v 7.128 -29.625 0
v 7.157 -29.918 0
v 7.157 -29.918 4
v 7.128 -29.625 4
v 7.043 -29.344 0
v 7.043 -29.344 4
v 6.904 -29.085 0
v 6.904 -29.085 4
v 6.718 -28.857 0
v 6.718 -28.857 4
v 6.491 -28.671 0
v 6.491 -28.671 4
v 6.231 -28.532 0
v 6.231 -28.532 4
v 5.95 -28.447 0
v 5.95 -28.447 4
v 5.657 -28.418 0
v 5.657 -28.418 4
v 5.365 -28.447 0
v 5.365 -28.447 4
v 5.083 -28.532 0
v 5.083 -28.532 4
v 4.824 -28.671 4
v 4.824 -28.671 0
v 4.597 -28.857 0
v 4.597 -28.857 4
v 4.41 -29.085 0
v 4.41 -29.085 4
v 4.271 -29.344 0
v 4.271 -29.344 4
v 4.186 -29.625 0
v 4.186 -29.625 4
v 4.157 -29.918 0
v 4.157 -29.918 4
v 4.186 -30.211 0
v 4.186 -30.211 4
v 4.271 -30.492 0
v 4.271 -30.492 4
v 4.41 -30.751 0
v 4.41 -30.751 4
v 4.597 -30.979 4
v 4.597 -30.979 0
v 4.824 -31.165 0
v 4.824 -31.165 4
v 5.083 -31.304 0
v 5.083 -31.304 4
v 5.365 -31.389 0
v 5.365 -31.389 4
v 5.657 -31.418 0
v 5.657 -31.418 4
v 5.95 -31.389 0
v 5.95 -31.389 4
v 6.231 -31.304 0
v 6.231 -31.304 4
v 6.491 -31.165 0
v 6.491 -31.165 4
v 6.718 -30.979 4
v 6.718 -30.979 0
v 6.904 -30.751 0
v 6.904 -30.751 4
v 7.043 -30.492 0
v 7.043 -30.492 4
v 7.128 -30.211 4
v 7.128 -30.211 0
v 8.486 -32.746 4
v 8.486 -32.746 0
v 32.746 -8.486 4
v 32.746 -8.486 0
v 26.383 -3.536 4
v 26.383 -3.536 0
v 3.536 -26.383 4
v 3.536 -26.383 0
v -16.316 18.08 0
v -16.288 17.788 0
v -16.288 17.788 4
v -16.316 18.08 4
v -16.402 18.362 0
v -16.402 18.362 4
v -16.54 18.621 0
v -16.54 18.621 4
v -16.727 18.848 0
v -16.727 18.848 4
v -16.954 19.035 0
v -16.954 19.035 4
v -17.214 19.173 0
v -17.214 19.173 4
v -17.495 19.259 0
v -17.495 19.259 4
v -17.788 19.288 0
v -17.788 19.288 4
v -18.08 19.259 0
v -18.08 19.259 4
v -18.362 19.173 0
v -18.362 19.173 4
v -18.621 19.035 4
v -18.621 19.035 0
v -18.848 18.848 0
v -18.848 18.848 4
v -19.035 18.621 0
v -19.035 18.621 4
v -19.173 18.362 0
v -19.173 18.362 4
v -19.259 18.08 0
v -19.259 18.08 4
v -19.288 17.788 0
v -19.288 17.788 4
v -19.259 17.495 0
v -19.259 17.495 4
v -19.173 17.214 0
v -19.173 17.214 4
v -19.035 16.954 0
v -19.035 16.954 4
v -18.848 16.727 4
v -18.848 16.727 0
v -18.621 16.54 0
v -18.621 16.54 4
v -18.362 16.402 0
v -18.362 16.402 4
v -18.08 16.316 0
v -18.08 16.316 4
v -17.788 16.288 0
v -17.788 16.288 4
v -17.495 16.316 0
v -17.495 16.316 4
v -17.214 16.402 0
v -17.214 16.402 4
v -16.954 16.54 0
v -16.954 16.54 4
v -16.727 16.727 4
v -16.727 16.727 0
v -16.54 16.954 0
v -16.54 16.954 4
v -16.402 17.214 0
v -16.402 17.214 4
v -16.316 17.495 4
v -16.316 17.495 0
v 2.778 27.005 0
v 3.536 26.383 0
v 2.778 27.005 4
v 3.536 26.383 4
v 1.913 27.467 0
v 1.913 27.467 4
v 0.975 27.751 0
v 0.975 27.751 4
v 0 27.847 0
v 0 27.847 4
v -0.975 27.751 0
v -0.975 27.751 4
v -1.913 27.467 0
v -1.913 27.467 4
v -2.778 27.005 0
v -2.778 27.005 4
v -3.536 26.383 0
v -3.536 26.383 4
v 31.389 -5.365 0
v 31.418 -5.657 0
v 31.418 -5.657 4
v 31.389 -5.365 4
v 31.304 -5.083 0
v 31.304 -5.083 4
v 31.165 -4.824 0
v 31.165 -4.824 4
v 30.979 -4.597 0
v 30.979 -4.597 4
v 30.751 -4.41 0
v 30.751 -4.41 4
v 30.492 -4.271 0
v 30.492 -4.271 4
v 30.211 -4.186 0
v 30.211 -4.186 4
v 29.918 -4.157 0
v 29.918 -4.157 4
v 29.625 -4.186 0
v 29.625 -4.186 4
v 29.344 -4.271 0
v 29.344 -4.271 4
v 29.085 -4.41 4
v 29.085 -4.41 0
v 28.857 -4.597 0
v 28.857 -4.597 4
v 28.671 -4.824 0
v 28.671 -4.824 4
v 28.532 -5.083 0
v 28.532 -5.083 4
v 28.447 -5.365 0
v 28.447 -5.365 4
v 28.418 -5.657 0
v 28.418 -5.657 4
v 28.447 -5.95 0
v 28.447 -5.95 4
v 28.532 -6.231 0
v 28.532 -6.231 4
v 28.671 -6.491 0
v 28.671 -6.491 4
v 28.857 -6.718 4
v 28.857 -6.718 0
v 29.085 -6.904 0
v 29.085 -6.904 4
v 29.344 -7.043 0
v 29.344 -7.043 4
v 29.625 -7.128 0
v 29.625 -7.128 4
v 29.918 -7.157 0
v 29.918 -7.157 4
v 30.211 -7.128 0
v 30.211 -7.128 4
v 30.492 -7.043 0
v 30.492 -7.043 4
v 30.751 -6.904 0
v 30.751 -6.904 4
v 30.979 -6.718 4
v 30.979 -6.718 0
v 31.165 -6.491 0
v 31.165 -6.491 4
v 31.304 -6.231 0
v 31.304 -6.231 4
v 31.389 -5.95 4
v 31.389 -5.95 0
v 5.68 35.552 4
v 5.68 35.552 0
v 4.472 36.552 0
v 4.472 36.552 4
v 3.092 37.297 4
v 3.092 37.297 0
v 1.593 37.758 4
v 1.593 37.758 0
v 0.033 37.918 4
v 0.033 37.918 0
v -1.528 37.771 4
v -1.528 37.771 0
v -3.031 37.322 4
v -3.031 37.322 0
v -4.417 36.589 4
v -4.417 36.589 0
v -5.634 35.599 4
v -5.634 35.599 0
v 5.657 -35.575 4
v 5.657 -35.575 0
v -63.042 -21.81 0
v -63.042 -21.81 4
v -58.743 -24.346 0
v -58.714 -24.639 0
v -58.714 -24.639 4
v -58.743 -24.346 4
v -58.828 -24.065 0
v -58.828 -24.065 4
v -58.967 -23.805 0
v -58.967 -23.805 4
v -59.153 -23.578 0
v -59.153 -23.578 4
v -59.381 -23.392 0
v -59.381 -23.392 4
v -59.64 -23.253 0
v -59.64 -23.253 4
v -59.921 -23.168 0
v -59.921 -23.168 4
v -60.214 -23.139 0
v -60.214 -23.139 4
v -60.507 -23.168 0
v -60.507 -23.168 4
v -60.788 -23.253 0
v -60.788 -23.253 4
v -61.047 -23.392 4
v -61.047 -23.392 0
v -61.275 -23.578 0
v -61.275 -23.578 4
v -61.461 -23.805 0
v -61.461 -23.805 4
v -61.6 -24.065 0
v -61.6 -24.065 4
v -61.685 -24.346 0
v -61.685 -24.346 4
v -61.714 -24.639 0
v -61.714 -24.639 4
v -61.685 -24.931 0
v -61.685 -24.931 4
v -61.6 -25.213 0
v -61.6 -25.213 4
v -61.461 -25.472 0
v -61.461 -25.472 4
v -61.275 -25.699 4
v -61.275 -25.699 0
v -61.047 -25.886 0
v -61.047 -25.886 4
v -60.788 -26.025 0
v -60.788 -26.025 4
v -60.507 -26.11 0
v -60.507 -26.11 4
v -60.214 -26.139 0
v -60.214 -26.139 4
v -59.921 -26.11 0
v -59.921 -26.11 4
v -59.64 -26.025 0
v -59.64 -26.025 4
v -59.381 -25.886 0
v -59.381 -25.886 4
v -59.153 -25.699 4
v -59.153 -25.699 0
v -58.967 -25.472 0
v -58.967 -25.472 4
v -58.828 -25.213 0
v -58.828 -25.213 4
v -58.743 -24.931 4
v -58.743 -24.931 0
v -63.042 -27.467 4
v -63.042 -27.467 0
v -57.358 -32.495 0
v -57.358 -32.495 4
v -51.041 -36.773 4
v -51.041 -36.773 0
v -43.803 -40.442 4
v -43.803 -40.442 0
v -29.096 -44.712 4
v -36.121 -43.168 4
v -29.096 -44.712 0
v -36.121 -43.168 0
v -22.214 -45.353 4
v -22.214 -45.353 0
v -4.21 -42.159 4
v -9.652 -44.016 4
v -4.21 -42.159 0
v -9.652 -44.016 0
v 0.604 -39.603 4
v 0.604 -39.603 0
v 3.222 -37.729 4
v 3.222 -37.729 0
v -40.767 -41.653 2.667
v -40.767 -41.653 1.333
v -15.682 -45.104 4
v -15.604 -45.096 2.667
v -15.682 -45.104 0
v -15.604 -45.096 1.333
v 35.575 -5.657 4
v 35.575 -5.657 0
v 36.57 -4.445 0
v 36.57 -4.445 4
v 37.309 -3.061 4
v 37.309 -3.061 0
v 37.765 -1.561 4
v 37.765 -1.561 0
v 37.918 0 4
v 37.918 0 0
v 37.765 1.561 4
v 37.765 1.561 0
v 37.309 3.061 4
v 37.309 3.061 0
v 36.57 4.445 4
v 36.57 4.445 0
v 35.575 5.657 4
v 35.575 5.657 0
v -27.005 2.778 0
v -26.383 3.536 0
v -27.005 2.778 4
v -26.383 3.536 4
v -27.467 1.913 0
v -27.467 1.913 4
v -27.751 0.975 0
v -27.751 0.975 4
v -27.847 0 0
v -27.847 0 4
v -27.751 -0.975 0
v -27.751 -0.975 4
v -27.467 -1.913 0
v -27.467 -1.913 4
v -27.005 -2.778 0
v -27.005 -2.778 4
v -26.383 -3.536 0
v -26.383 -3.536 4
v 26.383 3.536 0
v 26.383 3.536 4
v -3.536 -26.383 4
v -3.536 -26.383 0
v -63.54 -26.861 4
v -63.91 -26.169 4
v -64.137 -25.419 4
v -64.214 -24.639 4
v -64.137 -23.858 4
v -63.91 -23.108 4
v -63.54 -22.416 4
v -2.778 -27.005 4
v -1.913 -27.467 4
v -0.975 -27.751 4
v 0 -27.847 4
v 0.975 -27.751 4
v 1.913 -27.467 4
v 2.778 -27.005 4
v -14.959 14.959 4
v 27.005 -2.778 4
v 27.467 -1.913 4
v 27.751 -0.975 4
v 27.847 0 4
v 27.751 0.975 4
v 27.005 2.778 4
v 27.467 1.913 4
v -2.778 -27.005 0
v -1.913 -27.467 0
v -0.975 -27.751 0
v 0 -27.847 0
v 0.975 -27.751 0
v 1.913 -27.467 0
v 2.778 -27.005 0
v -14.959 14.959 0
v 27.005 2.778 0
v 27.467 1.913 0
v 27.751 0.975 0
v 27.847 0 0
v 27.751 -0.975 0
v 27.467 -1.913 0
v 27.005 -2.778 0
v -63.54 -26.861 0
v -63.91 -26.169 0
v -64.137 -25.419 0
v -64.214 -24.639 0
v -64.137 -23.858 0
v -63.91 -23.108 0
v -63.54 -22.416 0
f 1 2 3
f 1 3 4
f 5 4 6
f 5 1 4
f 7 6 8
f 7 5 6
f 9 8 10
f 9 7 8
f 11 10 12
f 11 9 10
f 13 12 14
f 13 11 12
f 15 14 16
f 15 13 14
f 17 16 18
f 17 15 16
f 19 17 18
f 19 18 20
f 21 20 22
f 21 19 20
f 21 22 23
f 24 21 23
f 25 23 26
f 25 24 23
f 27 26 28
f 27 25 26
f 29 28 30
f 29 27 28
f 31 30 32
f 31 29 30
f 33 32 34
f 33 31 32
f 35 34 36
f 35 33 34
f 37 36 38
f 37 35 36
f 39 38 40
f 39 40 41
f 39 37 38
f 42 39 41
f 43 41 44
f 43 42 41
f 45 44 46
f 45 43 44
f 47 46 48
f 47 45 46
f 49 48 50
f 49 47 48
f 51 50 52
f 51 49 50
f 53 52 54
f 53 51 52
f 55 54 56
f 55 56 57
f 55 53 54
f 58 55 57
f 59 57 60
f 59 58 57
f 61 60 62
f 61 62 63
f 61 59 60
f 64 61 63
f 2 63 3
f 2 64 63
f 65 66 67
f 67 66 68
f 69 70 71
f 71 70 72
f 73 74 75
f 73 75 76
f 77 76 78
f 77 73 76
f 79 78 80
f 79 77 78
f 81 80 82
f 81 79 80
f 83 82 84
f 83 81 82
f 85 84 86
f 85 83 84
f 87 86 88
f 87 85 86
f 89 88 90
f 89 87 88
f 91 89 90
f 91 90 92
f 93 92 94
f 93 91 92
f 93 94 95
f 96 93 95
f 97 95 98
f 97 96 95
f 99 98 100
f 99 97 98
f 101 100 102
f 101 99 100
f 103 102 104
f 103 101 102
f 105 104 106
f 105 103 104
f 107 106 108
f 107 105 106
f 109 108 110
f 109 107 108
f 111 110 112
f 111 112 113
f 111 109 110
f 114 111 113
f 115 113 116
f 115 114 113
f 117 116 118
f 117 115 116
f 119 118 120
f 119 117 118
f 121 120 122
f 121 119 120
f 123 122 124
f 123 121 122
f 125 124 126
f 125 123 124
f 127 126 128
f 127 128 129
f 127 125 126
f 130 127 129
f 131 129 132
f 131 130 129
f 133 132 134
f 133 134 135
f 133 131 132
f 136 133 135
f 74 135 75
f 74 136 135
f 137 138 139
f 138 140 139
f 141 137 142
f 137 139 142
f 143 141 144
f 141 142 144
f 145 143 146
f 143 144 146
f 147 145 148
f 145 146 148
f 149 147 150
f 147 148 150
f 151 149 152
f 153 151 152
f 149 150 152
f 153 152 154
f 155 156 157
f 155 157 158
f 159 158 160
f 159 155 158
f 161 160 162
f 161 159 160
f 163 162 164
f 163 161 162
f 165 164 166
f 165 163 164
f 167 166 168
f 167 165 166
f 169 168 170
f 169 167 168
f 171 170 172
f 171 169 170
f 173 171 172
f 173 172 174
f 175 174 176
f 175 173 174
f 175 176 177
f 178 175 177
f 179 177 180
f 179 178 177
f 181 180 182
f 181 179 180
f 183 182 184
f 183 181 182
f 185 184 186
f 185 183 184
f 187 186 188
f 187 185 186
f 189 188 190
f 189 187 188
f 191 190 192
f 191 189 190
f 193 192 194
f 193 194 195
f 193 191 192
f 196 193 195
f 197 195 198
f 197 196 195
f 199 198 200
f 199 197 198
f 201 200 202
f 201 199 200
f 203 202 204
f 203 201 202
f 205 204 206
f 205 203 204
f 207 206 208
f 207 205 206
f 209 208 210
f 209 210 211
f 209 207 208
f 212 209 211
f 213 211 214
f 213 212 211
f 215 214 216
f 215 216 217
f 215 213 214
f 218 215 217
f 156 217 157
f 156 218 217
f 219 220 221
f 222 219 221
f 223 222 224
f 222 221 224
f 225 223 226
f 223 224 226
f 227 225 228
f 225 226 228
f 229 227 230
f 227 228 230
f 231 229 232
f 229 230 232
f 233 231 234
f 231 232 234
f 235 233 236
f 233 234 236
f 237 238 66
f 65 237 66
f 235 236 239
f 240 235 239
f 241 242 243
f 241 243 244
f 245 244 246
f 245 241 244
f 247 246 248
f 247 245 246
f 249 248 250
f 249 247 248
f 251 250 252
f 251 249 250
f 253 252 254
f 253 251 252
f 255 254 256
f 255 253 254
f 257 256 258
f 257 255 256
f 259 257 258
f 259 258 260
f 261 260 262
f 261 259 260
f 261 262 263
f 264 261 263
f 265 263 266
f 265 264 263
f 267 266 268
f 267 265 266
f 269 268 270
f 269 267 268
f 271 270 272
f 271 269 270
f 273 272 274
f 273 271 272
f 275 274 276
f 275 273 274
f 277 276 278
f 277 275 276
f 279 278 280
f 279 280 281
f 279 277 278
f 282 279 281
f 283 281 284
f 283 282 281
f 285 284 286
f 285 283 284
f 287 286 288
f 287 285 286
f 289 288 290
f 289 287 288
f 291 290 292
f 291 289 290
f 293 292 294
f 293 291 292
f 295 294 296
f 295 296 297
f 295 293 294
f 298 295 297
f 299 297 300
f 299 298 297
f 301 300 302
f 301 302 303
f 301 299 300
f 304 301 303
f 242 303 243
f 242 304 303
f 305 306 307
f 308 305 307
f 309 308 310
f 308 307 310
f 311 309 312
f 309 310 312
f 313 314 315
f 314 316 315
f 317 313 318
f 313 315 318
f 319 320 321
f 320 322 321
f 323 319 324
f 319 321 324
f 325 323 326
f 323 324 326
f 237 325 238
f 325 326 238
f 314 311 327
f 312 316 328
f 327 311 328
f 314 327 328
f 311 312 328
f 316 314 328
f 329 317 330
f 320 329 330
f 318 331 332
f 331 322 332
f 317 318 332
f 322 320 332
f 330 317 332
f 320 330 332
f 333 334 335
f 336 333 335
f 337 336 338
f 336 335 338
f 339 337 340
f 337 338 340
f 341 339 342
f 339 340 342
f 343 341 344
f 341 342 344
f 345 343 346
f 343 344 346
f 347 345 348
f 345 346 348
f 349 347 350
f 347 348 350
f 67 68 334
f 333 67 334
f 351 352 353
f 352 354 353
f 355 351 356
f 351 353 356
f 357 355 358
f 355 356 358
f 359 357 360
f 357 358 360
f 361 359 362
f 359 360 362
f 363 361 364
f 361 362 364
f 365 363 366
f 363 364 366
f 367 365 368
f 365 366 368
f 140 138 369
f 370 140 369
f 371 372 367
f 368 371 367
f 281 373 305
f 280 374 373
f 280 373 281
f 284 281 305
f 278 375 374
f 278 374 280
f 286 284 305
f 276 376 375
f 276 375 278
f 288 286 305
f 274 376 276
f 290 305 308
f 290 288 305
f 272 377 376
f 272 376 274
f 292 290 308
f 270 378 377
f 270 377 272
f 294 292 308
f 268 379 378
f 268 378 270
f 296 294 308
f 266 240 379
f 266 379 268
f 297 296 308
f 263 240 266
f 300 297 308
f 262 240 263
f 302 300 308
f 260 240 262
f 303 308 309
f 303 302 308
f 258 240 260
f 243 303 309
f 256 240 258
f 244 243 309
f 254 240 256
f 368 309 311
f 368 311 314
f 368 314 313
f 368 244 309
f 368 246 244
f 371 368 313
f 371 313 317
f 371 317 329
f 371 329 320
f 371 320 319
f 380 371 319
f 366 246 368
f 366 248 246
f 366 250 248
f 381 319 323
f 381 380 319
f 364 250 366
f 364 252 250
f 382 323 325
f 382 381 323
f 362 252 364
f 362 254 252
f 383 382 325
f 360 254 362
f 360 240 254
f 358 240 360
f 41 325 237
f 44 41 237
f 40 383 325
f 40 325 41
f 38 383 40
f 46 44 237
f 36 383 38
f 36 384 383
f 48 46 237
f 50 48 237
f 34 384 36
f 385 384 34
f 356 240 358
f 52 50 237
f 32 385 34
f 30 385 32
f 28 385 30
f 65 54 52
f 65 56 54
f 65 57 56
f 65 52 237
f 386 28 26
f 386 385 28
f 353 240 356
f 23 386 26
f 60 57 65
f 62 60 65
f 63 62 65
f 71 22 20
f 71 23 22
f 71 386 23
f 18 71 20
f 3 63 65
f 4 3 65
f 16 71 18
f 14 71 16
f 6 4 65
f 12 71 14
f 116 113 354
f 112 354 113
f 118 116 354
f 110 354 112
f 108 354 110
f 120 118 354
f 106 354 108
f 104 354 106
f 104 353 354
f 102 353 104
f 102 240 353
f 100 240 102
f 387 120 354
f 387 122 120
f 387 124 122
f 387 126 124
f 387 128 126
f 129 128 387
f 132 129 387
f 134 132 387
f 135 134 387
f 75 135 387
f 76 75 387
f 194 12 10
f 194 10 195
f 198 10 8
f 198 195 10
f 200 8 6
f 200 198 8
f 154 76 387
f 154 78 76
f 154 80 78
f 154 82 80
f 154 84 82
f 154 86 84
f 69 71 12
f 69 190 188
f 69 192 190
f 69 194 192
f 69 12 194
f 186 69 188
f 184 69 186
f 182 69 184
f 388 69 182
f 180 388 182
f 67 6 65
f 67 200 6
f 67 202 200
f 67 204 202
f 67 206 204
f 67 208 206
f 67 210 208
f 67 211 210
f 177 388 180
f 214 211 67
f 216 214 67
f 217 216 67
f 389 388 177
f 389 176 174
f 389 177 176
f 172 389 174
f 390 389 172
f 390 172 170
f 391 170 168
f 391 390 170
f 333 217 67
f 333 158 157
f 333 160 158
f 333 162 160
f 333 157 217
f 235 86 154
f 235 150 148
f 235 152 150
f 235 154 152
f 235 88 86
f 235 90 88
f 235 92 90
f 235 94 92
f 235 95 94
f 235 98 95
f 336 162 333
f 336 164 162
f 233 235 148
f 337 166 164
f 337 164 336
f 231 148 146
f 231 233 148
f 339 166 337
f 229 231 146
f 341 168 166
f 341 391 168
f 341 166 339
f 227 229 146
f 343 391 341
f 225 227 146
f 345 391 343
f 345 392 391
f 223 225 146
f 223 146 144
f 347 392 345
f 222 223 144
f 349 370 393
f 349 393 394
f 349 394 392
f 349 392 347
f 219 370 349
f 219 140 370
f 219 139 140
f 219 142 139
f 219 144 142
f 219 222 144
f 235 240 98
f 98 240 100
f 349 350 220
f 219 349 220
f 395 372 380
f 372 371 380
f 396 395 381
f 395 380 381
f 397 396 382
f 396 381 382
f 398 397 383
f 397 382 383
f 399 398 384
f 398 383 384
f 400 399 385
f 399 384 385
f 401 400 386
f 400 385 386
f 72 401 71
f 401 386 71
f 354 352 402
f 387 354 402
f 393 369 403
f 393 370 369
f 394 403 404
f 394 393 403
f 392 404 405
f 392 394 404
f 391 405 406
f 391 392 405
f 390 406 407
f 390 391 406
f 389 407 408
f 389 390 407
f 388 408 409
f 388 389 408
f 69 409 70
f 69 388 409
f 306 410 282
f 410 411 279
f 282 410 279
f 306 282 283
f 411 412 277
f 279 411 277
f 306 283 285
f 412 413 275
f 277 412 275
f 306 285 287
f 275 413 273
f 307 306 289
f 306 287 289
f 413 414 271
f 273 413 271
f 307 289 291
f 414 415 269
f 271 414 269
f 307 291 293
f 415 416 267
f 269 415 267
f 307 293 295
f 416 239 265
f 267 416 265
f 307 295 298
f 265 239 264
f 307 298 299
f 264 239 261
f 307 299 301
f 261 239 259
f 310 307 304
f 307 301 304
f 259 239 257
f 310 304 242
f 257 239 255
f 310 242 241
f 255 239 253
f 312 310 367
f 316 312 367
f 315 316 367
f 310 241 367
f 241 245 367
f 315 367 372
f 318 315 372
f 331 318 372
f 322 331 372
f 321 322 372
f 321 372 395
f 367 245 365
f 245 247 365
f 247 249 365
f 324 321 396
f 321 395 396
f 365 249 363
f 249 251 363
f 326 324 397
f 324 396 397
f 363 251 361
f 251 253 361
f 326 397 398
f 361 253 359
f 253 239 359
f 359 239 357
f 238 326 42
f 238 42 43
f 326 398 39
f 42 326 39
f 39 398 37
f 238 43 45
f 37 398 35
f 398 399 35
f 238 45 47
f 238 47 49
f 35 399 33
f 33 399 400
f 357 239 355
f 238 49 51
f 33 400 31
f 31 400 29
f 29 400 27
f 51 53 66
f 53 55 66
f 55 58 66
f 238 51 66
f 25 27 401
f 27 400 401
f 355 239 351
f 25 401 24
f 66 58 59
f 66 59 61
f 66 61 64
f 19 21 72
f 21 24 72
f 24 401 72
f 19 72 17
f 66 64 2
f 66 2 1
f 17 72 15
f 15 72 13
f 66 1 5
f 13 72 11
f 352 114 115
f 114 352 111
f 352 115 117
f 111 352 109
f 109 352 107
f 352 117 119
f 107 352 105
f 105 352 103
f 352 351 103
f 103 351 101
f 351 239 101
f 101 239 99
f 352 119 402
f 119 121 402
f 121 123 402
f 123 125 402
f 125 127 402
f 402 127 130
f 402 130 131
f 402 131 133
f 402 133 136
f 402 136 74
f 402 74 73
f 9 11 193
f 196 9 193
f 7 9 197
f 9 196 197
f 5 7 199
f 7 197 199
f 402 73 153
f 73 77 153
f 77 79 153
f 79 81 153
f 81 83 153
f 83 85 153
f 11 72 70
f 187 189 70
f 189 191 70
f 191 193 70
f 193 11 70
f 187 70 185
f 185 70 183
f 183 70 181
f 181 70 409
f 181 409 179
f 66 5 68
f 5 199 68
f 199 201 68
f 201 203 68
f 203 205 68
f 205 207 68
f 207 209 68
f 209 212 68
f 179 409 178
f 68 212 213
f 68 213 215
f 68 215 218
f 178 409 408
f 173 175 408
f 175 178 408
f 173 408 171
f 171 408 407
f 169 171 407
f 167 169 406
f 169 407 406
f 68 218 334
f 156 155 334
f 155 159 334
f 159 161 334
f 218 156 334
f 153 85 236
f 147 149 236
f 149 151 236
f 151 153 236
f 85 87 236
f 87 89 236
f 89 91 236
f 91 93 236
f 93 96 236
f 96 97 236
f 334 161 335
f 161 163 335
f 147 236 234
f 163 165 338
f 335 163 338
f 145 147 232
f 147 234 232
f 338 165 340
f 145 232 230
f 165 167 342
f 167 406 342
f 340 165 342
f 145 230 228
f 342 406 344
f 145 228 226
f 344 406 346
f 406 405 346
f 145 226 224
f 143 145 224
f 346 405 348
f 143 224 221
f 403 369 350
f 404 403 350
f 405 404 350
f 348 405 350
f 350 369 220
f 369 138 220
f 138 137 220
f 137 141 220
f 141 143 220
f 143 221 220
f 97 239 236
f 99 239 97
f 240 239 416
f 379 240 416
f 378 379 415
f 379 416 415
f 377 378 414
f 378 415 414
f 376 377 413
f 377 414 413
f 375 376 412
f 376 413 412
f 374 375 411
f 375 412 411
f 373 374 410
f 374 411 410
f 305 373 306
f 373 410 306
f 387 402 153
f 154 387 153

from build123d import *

# Parameters (mm, degrees)
SKETCH1_R           = 1.5
BOSS_EXTRUDE1_DEPTH = 4
FILLET1_R           = 5


with BuildPart() as part:
    # Sketch1 → Boss-Extrude1 (new body)
    with BuildSketch(Plane.XY):
        with BuildLine():
            Line((-20.616075737, 20.616075737), (-63.042482608, -21.810331134))
            ThreePointArc((-63.042482608, -21.810331134), (-64.214055483, -24.638758259), (-63.042482608, -27.467185384))
            add(Edge.make_bspline(
                [(-63.042482608, -27.467185384), (-44.475149979, -46.28503097), (-11.38960692, -52.316770126), (5.656854249, -35.575297224)],
                knots=[0, 0, 0, 0, 1, 1, 1, 1], degree=3))
            Line((5.656854249, -35.575297224), (8.485658906, -32.746492568))
            Line((8.485658906, -32.746492568), (32.746492568, -8.485658906))
            Line((32.746492568, -8.485658906), (35.575297224, -5.656854249))
            ThreePointArc((35.575297224, -5.656854249), (37.918442975, 0), (35.575297224, 5.656854249))
            Line((35.575297224, 5.656854249), (5.680184525, 35.551966949))
            ThreePointArc((5.680184525, 35.551966949), (0.032993992, 37.918442975), (-5.633523974, 35.5986275))
            Line((-5.633523974, 35.5986275), (-20.616075737, 20.616075737))
        make_face()
        with Locations((29.918065443, -5.657231781)):
            Circle(SKETCH1_R, mode=Mode.SUBTRACT)
        with Locations((5.657231781, -29.918065443)):
            Circle(SKETCH1_R, mode=Mode.SUBTRACT)
        with Locations((-17.787648612, 17.787648612)):
            Circle(SKETCH1_R, mode=Mode.SUBTRACT)
        with Locations((-60.214055483, -24.638758259)):
            Circle(SKETCH1_R, mode=Mode.SUBTRACT)
        Polygon((29.918442975, 0), (0, -29.918442975), (-29.918442975, 0), (-14.959221487, 14.959221487), (0, 29.918442975), align=None, mode=Mode.SUBTRACT)
    extrude(amount=BOSS_EXTRUDE1_DEPTH)

    # Fillet1
    fillet1_edges = [part.edges().sort_by_distance(p)[0] for p in [
        (-29.918442975, 0, 2),
        (0, -29.918442975, 2),
        (29.918442975, 0, 2),
        (0, 29.918442975, 2),
    ]]
    fillet(fillet1_edges, radius=FILLET1_R)


solid = part.part
